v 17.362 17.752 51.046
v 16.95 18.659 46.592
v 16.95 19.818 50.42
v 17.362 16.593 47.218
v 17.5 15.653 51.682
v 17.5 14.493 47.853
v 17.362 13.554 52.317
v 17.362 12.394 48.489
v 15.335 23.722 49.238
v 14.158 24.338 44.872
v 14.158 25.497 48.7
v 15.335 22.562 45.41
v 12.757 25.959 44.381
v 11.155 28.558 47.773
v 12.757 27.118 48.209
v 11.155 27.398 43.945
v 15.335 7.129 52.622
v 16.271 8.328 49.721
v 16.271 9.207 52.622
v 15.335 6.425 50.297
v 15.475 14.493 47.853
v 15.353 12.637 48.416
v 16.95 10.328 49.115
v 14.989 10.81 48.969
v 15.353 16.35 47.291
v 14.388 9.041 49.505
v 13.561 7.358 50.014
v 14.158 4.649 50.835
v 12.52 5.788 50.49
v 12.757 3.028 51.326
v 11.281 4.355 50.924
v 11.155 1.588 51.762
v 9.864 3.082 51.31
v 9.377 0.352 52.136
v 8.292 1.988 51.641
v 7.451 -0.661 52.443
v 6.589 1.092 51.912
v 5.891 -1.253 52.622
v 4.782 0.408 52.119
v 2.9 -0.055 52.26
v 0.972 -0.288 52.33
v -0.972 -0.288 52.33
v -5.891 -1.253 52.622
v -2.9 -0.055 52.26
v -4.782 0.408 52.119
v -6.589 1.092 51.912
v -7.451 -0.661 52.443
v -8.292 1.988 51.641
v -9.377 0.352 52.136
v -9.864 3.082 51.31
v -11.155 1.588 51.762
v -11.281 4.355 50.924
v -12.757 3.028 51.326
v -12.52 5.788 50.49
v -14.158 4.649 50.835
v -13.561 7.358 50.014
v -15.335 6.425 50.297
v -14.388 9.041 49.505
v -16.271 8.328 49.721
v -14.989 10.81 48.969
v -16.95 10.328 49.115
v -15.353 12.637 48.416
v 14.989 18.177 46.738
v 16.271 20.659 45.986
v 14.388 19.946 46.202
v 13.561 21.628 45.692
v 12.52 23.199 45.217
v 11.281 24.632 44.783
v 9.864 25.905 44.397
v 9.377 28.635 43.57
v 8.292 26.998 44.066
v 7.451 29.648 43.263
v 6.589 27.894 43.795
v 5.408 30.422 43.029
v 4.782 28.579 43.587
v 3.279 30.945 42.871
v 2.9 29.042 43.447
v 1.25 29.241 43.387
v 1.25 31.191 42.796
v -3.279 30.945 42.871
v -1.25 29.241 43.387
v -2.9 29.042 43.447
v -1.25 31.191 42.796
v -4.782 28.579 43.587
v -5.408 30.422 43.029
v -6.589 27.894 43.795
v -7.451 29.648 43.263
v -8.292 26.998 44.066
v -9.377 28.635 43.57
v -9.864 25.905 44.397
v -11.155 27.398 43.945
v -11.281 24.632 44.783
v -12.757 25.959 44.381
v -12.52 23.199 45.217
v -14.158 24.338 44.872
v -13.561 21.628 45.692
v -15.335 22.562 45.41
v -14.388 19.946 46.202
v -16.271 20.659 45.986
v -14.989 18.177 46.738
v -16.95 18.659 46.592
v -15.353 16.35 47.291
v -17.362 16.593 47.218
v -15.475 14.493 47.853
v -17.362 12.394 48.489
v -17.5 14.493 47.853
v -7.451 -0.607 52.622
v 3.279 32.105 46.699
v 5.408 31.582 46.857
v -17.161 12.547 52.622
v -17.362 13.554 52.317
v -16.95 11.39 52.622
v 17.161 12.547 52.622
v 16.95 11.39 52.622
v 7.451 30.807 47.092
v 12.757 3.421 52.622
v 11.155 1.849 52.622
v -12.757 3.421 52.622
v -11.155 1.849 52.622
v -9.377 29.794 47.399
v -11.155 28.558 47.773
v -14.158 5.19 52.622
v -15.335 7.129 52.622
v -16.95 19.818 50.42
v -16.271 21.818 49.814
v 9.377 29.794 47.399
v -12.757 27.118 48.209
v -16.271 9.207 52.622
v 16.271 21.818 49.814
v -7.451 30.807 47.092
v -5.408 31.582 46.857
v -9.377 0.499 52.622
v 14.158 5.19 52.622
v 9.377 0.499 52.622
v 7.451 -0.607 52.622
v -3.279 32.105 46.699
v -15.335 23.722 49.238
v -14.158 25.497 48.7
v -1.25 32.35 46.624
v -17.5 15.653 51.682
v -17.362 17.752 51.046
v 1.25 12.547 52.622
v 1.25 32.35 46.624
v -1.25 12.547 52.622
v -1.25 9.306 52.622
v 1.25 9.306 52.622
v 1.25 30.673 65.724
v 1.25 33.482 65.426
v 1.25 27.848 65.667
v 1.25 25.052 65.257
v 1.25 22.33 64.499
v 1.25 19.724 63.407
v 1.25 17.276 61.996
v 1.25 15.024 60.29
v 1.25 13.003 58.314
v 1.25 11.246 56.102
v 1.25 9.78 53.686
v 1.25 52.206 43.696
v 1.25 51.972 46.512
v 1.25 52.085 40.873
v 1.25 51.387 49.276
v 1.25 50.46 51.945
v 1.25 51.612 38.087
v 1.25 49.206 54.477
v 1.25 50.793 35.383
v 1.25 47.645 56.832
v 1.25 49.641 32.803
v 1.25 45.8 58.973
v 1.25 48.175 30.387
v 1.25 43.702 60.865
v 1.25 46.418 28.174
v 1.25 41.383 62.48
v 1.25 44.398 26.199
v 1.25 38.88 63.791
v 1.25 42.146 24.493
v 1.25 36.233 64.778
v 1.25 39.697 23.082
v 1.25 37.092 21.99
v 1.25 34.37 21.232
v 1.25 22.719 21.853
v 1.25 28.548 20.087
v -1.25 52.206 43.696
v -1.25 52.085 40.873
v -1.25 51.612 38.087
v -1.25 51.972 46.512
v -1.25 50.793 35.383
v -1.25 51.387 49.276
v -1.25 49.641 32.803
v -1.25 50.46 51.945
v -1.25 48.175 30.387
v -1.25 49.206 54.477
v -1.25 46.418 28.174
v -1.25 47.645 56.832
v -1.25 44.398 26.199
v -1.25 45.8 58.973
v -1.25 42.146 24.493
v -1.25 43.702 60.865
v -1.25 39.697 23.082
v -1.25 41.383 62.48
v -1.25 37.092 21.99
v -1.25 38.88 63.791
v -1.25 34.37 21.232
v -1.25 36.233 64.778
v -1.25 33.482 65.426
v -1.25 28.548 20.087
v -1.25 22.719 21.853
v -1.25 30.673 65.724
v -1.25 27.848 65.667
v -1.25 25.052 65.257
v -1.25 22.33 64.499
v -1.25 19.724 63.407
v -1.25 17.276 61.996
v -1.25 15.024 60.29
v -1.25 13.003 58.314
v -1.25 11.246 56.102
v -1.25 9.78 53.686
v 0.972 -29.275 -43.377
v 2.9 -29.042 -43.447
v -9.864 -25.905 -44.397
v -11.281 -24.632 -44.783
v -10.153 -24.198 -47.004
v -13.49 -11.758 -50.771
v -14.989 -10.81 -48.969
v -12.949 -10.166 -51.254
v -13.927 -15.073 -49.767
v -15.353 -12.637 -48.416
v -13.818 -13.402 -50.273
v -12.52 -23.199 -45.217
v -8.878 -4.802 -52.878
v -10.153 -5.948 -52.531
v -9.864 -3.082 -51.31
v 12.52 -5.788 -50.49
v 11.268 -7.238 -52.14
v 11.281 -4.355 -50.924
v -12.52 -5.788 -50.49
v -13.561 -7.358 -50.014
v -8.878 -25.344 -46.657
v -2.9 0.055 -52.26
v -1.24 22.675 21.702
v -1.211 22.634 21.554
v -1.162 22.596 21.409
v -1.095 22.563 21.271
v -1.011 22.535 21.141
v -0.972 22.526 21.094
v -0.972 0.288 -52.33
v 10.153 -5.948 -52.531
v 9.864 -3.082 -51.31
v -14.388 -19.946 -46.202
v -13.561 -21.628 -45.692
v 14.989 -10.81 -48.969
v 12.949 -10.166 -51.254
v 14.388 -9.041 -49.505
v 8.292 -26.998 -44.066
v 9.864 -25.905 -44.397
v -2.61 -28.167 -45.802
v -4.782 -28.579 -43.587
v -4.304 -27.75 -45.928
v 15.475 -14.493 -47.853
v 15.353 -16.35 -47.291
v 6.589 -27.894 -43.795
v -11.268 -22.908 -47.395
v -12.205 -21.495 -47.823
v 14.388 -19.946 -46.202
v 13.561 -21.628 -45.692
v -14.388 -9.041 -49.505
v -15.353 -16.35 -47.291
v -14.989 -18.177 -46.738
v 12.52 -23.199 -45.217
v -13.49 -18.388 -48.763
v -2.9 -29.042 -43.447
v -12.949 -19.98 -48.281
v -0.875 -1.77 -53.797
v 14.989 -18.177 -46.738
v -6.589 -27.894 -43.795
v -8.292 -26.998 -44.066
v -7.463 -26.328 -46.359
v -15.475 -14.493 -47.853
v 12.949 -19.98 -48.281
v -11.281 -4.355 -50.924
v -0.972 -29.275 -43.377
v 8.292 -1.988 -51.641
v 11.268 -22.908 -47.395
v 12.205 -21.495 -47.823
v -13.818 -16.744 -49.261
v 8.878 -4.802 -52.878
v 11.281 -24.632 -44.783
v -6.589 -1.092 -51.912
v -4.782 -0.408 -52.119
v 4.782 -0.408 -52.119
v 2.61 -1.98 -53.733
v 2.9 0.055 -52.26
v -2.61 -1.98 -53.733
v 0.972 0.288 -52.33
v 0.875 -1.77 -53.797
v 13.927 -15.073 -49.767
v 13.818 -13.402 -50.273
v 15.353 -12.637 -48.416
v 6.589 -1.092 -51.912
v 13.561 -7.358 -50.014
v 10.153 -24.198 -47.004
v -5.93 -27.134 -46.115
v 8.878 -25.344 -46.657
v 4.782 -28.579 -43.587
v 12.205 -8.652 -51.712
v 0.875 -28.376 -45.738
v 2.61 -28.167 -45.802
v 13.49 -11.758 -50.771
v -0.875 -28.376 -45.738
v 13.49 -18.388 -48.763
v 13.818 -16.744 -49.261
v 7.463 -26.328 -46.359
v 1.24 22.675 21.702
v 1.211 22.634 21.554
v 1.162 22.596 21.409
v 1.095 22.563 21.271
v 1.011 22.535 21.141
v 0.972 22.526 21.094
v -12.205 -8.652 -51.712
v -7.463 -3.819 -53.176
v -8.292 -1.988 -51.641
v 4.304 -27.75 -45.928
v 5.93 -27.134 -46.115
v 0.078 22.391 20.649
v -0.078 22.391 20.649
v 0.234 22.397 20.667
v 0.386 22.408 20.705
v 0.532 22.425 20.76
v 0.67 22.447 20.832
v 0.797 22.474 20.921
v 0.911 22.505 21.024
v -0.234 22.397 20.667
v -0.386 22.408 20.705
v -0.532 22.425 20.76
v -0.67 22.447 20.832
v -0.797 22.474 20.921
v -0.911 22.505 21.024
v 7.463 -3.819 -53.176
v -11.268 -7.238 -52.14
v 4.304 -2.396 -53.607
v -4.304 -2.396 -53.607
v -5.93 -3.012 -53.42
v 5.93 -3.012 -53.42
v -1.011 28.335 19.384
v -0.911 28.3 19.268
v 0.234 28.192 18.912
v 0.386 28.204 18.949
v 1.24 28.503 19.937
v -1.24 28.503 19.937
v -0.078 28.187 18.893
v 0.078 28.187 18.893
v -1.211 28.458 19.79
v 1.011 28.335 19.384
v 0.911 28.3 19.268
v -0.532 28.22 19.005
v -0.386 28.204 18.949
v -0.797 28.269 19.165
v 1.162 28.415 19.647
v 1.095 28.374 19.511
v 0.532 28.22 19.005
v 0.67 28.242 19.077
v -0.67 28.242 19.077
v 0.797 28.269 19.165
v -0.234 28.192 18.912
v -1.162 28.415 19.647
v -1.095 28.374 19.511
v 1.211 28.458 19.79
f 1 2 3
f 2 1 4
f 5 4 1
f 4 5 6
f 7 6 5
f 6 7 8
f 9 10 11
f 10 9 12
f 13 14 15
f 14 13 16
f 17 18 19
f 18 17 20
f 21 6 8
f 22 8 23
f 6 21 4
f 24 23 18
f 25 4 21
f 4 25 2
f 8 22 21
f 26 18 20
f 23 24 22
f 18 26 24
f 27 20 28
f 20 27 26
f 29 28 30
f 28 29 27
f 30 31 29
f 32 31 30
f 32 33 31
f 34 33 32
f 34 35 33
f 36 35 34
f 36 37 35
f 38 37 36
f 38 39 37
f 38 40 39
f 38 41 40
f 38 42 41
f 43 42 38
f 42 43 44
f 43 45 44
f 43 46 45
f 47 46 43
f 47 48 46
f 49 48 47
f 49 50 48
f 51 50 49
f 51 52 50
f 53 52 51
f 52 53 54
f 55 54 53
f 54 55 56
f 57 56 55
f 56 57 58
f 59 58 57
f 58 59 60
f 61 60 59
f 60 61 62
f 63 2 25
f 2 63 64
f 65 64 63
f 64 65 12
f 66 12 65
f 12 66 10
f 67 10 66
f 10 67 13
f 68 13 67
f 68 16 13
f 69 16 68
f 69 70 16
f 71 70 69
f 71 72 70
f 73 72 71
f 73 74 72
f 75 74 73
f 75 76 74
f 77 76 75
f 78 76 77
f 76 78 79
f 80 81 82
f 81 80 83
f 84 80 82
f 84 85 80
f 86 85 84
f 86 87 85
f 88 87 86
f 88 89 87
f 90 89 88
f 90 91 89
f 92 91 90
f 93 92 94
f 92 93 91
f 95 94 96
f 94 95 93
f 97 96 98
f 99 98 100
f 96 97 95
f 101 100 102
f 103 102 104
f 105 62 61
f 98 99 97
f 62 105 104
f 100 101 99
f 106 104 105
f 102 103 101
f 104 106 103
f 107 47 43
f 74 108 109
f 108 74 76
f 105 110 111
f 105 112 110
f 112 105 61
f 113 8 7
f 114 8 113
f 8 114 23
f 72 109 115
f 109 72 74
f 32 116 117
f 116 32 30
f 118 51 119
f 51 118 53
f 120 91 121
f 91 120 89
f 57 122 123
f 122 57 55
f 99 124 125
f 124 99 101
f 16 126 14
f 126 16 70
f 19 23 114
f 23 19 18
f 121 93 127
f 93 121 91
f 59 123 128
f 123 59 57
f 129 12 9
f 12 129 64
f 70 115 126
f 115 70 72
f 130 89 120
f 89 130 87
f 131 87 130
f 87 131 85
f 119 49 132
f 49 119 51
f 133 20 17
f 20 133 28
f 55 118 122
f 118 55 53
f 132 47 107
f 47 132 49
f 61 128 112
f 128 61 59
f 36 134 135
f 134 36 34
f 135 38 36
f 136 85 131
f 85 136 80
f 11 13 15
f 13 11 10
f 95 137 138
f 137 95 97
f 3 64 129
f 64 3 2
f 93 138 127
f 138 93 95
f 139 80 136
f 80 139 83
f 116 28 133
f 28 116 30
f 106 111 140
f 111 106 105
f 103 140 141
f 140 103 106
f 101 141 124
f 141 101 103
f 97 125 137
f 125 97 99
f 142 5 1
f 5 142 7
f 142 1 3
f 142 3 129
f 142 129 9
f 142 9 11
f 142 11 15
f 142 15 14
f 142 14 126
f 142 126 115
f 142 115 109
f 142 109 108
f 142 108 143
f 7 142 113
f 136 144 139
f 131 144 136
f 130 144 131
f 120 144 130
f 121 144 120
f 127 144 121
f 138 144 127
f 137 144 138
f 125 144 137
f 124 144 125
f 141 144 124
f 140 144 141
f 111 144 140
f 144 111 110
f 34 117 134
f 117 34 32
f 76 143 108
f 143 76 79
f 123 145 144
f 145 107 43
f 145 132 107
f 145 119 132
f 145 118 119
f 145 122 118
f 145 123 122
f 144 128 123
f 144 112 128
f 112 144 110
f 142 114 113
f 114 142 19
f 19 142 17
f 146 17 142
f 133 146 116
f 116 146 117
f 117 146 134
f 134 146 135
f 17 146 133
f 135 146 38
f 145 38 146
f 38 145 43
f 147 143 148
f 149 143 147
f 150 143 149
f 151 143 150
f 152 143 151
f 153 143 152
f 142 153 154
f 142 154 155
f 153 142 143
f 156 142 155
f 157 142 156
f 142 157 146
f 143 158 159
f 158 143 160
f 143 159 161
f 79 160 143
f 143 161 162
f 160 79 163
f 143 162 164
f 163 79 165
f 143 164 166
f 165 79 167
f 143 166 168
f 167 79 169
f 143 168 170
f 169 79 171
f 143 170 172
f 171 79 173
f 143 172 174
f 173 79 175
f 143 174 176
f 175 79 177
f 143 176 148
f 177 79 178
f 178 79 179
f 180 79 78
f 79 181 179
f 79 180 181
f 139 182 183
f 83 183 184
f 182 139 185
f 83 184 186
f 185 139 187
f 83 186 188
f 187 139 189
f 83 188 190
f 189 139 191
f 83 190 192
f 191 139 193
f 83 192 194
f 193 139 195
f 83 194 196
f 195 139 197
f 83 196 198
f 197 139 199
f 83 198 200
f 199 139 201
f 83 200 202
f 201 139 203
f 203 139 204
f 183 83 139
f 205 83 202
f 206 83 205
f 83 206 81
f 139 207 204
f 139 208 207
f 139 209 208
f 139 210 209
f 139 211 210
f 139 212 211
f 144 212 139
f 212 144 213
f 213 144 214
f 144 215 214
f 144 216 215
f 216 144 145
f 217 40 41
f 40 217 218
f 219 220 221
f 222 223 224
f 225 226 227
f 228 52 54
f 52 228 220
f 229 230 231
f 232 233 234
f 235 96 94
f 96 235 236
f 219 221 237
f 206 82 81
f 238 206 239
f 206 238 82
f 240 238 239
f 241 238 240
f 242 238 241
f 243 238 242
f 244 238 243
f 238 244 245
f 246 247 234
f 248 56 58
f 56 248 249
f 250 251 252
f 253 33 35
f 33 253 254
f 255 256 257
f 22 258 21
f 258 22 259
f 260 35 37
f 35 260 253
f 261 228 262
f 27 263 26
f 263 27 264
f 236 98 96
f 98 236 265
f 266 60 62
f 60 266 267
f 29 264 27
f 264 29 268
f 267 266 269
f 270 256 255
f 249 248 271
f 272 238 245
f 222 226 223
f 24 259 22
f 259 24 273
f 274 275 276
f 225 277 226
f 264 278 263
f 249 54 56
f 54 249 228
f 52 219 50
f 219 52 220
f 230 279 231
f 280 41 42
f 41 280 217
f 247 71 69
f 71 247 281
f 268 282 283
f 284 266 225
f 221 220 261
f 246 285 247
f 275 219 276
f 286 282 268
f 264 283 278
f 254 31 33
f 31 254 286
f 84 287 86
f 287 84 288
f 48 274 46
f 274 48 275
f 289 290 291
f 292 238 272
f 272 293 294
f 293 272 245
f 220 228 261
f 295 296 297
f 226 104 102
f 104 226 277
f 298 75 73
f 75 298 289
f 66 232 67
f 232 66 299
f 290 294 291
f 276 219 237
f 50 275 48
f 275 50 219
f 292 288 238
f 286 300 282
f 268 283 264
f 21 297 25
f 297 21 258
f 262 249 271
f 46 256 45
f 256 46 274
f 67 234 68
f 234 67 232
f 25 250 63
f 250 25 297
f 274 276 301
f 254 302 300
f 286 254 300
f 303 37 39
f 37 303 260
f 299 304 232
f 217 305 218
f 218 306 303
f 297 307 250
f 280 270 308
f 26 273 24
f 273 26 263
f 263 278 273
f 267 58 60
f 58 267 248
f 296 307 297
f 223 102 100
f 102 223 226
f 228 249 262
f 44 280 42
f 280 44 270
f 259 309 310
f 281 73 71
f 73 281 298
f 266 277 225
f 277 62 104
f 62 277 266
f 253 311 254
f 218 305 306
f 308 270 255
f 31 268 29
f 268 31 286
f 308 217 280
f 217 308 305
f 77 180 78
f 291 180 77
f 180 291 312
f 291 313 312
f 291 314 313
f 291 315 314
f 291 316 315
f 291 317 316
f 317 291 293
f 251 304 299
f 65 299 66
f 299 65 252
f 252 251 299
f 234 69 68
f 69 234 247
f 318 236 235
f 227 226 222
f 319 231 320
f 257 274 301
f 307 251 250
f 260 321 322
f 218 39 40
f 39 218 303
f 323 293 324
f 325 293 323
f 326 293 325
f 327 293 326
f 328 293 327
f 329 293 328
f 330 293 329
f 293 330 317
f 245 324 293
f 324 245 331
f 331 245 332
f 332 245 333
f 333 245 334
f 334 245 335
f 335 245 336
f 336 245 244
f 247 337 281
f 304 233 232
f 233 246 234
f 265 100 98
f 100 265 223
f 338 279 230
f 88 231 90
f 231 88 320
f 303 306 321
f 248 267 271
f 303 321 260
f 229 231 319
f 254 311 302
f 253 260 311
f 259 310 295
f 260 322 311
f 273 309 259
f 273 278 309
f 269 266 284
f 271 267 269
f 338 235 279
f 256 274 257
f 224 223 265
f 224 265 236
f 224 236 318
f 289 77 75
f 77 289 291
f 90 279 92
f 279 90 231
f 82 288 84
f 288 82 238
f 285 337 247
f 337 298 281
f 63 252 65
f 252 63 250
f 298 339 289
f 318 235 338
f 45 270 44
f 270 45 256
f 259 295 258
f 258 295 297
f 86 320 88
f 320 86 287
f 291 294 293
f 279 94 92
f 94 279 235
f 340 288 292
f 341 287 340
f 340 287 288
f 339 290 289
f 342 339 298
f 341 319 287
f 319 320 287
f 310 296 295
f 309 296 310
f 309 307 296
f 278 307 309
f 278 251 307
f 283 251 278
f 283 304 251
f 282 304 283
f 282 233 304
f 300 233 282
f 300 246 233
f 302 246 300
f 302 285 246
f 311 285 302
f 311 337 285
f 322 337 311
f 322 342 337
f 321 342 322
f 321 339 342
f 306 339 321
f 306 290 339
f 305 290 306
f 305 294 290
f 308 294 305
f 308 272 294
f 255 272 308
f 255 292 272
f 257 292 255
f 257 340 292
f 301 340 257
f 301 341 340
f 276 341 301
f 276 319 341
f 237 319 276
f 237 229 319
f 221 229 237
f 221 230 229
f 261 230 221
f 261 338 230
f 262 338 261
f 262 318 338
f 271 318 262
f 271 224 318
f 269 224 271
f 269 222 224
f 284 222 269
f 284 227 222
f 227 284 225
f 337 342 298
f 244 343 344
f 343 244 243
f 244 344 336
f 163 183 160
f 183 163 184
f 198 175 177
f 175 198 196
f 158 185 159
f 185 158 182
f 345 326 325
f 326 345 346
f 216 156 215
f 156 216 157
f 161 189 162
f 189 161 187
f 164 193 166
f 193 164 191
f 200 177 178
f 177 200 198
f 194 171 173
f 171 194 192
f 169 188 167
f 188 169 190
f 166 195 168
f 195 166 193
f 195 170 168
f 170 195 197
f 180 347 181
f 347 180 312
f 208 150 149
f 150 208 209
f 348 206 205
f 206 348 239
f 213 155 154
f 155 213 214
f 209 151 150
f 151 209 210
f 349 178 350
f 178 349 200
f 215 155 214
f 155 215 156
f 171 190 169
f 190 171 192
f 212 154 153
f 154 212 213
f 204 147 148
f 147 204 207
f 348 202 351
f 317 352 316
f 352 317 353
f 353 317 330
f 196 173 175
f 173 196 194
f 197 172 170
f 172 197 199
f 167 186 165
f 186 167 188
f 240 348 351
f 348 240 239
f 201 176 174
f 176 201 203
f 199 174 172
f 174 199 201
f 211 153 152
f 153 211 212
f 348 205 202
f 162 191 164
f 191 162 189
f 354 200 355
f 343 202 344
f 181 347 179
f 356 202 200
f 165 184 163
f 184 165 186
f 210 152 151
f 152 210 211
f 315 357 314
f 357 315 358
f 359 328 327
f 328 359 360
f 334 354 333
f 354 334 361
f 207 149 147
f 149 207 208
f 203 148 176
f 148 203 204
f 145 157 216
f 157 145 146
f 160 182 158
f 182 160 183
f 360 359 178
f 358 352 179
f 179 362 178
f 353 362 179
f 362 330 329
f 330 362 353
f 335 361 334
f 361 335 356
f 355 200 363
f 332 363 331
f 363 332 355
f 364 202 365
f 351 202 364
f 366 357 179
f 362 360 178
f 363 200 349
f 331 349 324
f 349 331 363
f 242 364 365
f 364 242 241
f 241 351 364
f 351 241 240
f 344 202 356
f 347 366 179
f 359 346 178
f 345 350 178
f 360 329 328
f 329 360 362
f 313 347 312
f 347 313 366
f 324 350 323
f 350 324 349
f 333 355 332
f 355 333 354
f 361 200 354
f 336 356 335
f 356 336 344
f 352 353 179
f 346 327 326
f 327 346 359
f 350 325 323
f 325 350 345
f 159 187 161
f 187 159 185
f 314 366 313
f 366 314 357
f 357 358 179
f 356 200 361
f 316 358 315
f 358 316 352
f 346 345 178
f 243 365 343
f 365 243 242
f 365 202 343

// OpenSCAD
// Units in millimeters

$fn=50;

seattube_angle=16.85; // Must absolutely be > 16.5°
seattube_height = 100;
seattube_diameter = 30.95;
seattube_radius = seattube_diameter / 2;
constriction_diameter = 35.00;
constriction_height = 12;
frametube_diameter = 36.65;
clip_width = 2.5;
clip_height = 22.5;
clip_depth = 2;
rail_width = 7;
rail_height = 9;
rail_length = 37;
rails_distance = 37;
screw_diameter = 5;
screw_head_thickness = 2.5;
washer_diameter = 8;
washer_thickness = 1.2;
nut_thickness = 3.15;
nut_side = 6.9;

module hexagon(cube_side, h)
{
	hull()
	{
		cube([cube_side, cube_side / (cos(30) * 2), h], center = true);
		rotate([0, 0, 120])	cube([cube_side, cube_side / (cos(30) * 2), h], center = true);
		rotate([0, 0, 240])	cube([cube_side, cube_side / (cos(30) * 2), h], center = true);
	}
	
}

module frametube()
{
	difference()
	{
		union()
		{
			// Frame
			translate([0, 0, -constriction_height / 2])	cylinder(d = frametube_diameter, h = seattube_height - constriction_height, center = true);
			// Constriction
			translate([0, 0, (seattube_height - constriction_height) / 2]) cylinder(d = constriction_diameter, h = constriction_height, center = true);
		}		
		cylinder(d = 30.50, h = seattube_height + 0.1, center = true);
		translate([0, 16.5, (100 - 23) / 2 + 0.01])	cube([clip_width, 4, 23], center = true);
		translate([0, 16.5, 27]) rotate([90,0,0])   cylinder(d = clip_width, h = 4, center = true);
	}
}

module seattube()
{
    // Cylindrical main tube
	hull()
	{
		cylinder(h = seattube_height, r = seattube_radius, center = true);
		translate([0, 0, -51])
			cylinder(h = 2, r = seattube_radius * 0.9, center = true);
	}
	difference()
	{
		translate([0, 0, 52])
			cylinder(h = 4, d = constriction_diameter, center = true);
		translate([0, -10, 83.3])
			rotate([seattube_angle, 0, 0])
				cube(60, center = true);		
	}
	// Posterior tube clip
	hull()
	{
		translate([0, 15.9, 50.0]) rotate([ 0, 90, 0]) cylinder(r = clip_height, h = clip_width, center = true);
		translate([0, 16.5, 27.5]) rotate([90,  0, 0]) cylinder(d = clip_width,  h = 10,         center = true);
	}
	
	intersection()
	{
		union()
		{
			translate([0, 0, 44])                           cylinder(d = constriction_diameter - 0.01, h = constriction_height + 0.1, center = true);
			translate([0, 0, 26 - constriction_height / 2]) cylinder(d = frametube_diameter - 0.01, h = 24 - constriction_height - 0.01, center = true);
		}
		union()
		{
			translate([0, 16.5, (100 - 22.5) / 2 + 0.01])
				cube([clip_width, 4, 22.5 + 0.01], center = true);
			#translate([0, 16.5, 27.5])
				rotate([90,0,0])
					cylinder(d = clip_width, h = 4, center = true);
		}
	}
	
}

module saddle_rails()
{
	translate([(rails_distance + rail_width) / 2, 0, 0])
		hull()
		{
			translate([0, 0, (rail_height - rail_width) / 2])
				rotate([90,0,0])
					cylinder(d = rail_width, h = rail_length * 2, center = true);
			translate([0, 0, -(rail_height - rail_width) / 2])
				rotate([90,0,0])
					cylinder(d = rail_width, h = rail_length * 2, center = true);
		}
	translate([-(rails_distance + rail_width) / 2, 0, 0])
		hull()
		{
			translate([0, 0, (rail_height - rail_width) / 2])
				rotate([90,0,0])
					cylinder(d = rail_width, h = rail_length * 2, center = true);
			translate([0, 0, -(rail_height - rail_width) / 2])
				rotate([90,0,0])
					cylinder(d = rail_width, h = rail_length * 2, center = true);
		}
}

holes_horizontal_offset = 13;
module screws()
{
	translate([holes_horizontal_offset, 0, 0])
		cylinder(d = screw_diameter, h = 19, center = true);
	translate([-holes_horizontal_offset, 0, 0])
		cylinder(d = screw_diameter, h = 19, center = true);
}
//translate([0, 37, 53.5])
//	color("grey") screws();

//rotate([-seattube_angle, 0, 0])
//	color("black") frametube();

rails_vertical_offset = 56.3;


rotate([-seattube_angle, 0, 0])
	seattube();

// Lower saddle support
/*
difference ()
{
	union()
	{
		hull()
		{
			rotate([-seattube_angle / 2, 0, 0])
				translate([0, 7.875, 50])
					difference()
					{
						scale([1, 1, 0.4])
							sphere(d = seattube_diameter);
						translate([0, 0, -seattube_diameter / 2 + 2])
							cube(seattube_diameter, center = true);
					}
			translate([0, 37.5, 50.25])
				scale([1, 1, 0.2])
					sphere(d = 60);
		}
		
		
		// Middle fin
		translate([0, 44, 47.15])
			rotate([90, 0, 0])
				cylinder(d = 10, h = 24, center = true);
		translate([0, 56, 47.15])
			scale([1, 1.5, 1])
				sphere(d = 10);
		
	}
	// Trace rails volume
	translate([0, 40, rails_vertical_offset])
		saddle_rails();
	// Trace screw holes
	translate([holes_horizontal_offset, 37, 50.5])
		cylinder(d = screw_diameter, h = 13, center = true);
	translate([-holes_horizontal_offset, 37, 50.5])
		cylinder(d = screw_diameter, h = 13, center = true);
	// Trace washer holes
	translate([holes_horizontal_offset, 37, 46.9])
		cylinder(d = washer_diameter, h = washer_thickness + screw_head_thickness + 1.1, center = true);
	translate([-holes_horizontal_offset, 37, 46.9])
		cylinder(d = washer_diameter, h = washer_thickness + screw_head_thickness + 1.1, center = true);
}
*/

// Upper saddle support
/*
difference()
{
	translate([0, 37.5, 60]) 
	{
		hull()
		{
			translate([-(rails_distance + rail_width) / 2, 0, 0])
			{
				scale([1.3, 1, 0.7])
					rotate([90,0,0])
						cylinder(d = rail_length / 5 , h = rail_length / 3, center = true);
				translate([0, rail_length / 6, 0])
					scale([1.3, 3, 0.7])
						sphere(d = rail_length / 5);
				translate([0, -rail_length / 6, 0])
					scale([1.3, 3, 0.7])
						sphere(d = rail_length / 5);
			}
			translate([(rails_distance + rail_width) / 2, 0, 0])
			{
				scale([1.3, 1, 0.7])
					rotate([90,0,0])
						cylinder(d = rail_length / 5 , h = rail_length / 3, center = true);
				translate([0, rail_length / 6, 0])
					scale([1.3, 3, 0.7])
						sphere(d = rail_length / 5);
				translate([0, -rail_length / 6, 0])
					scale([1.3, 3, 0.7])
						sphere(d = rail_length / 5);
			}
		}
		// Screw aero covers
		translate([holes_horizontal_offset, 0, -5 + 0.01])
			scale([1, 3, 1])
				cylinder(d = screw_diameter * 1.2, h = 3);
		translate([-holes_horizontal_offset, 0, -5 + 0.01])
			scale([1, 3, 1])
				cylinder(d = screw_diameter * 1.2, h = 3);
	}
	// Trace rails volume
	translate([0, 40, rails_vertical_offset])
		saddle_rails();
	
	// Trace screw holes
	translate([holes_horizontal_offset, 37, 60])
		cylinder(d = screw_diameter, h = 10, center = true);
	translate([-holes_horizontal_offset, 37, 60])
		cylinder(d = screw_diameter, h = 10, center = true);
	// Trace nut holes
	translate([holes_horizontal_offset, 37, 61.1])
		hexagon(cube_side = nut_side, h = nut_thickness);
	translate([-holes_horizontal_offset, 37, 61.1])
		hexagon(cube_side = nut_side, h = nut_thickness);
	// Shape screw aero covers rounded base
	translate([0, 37.5, 50.5])
		scale([1, 1, 0.2])
			sphere(d = 60); 
}
*/
//translate([0, 40, rails_vertical_offset])
//	color("grey") saddle_rails();
